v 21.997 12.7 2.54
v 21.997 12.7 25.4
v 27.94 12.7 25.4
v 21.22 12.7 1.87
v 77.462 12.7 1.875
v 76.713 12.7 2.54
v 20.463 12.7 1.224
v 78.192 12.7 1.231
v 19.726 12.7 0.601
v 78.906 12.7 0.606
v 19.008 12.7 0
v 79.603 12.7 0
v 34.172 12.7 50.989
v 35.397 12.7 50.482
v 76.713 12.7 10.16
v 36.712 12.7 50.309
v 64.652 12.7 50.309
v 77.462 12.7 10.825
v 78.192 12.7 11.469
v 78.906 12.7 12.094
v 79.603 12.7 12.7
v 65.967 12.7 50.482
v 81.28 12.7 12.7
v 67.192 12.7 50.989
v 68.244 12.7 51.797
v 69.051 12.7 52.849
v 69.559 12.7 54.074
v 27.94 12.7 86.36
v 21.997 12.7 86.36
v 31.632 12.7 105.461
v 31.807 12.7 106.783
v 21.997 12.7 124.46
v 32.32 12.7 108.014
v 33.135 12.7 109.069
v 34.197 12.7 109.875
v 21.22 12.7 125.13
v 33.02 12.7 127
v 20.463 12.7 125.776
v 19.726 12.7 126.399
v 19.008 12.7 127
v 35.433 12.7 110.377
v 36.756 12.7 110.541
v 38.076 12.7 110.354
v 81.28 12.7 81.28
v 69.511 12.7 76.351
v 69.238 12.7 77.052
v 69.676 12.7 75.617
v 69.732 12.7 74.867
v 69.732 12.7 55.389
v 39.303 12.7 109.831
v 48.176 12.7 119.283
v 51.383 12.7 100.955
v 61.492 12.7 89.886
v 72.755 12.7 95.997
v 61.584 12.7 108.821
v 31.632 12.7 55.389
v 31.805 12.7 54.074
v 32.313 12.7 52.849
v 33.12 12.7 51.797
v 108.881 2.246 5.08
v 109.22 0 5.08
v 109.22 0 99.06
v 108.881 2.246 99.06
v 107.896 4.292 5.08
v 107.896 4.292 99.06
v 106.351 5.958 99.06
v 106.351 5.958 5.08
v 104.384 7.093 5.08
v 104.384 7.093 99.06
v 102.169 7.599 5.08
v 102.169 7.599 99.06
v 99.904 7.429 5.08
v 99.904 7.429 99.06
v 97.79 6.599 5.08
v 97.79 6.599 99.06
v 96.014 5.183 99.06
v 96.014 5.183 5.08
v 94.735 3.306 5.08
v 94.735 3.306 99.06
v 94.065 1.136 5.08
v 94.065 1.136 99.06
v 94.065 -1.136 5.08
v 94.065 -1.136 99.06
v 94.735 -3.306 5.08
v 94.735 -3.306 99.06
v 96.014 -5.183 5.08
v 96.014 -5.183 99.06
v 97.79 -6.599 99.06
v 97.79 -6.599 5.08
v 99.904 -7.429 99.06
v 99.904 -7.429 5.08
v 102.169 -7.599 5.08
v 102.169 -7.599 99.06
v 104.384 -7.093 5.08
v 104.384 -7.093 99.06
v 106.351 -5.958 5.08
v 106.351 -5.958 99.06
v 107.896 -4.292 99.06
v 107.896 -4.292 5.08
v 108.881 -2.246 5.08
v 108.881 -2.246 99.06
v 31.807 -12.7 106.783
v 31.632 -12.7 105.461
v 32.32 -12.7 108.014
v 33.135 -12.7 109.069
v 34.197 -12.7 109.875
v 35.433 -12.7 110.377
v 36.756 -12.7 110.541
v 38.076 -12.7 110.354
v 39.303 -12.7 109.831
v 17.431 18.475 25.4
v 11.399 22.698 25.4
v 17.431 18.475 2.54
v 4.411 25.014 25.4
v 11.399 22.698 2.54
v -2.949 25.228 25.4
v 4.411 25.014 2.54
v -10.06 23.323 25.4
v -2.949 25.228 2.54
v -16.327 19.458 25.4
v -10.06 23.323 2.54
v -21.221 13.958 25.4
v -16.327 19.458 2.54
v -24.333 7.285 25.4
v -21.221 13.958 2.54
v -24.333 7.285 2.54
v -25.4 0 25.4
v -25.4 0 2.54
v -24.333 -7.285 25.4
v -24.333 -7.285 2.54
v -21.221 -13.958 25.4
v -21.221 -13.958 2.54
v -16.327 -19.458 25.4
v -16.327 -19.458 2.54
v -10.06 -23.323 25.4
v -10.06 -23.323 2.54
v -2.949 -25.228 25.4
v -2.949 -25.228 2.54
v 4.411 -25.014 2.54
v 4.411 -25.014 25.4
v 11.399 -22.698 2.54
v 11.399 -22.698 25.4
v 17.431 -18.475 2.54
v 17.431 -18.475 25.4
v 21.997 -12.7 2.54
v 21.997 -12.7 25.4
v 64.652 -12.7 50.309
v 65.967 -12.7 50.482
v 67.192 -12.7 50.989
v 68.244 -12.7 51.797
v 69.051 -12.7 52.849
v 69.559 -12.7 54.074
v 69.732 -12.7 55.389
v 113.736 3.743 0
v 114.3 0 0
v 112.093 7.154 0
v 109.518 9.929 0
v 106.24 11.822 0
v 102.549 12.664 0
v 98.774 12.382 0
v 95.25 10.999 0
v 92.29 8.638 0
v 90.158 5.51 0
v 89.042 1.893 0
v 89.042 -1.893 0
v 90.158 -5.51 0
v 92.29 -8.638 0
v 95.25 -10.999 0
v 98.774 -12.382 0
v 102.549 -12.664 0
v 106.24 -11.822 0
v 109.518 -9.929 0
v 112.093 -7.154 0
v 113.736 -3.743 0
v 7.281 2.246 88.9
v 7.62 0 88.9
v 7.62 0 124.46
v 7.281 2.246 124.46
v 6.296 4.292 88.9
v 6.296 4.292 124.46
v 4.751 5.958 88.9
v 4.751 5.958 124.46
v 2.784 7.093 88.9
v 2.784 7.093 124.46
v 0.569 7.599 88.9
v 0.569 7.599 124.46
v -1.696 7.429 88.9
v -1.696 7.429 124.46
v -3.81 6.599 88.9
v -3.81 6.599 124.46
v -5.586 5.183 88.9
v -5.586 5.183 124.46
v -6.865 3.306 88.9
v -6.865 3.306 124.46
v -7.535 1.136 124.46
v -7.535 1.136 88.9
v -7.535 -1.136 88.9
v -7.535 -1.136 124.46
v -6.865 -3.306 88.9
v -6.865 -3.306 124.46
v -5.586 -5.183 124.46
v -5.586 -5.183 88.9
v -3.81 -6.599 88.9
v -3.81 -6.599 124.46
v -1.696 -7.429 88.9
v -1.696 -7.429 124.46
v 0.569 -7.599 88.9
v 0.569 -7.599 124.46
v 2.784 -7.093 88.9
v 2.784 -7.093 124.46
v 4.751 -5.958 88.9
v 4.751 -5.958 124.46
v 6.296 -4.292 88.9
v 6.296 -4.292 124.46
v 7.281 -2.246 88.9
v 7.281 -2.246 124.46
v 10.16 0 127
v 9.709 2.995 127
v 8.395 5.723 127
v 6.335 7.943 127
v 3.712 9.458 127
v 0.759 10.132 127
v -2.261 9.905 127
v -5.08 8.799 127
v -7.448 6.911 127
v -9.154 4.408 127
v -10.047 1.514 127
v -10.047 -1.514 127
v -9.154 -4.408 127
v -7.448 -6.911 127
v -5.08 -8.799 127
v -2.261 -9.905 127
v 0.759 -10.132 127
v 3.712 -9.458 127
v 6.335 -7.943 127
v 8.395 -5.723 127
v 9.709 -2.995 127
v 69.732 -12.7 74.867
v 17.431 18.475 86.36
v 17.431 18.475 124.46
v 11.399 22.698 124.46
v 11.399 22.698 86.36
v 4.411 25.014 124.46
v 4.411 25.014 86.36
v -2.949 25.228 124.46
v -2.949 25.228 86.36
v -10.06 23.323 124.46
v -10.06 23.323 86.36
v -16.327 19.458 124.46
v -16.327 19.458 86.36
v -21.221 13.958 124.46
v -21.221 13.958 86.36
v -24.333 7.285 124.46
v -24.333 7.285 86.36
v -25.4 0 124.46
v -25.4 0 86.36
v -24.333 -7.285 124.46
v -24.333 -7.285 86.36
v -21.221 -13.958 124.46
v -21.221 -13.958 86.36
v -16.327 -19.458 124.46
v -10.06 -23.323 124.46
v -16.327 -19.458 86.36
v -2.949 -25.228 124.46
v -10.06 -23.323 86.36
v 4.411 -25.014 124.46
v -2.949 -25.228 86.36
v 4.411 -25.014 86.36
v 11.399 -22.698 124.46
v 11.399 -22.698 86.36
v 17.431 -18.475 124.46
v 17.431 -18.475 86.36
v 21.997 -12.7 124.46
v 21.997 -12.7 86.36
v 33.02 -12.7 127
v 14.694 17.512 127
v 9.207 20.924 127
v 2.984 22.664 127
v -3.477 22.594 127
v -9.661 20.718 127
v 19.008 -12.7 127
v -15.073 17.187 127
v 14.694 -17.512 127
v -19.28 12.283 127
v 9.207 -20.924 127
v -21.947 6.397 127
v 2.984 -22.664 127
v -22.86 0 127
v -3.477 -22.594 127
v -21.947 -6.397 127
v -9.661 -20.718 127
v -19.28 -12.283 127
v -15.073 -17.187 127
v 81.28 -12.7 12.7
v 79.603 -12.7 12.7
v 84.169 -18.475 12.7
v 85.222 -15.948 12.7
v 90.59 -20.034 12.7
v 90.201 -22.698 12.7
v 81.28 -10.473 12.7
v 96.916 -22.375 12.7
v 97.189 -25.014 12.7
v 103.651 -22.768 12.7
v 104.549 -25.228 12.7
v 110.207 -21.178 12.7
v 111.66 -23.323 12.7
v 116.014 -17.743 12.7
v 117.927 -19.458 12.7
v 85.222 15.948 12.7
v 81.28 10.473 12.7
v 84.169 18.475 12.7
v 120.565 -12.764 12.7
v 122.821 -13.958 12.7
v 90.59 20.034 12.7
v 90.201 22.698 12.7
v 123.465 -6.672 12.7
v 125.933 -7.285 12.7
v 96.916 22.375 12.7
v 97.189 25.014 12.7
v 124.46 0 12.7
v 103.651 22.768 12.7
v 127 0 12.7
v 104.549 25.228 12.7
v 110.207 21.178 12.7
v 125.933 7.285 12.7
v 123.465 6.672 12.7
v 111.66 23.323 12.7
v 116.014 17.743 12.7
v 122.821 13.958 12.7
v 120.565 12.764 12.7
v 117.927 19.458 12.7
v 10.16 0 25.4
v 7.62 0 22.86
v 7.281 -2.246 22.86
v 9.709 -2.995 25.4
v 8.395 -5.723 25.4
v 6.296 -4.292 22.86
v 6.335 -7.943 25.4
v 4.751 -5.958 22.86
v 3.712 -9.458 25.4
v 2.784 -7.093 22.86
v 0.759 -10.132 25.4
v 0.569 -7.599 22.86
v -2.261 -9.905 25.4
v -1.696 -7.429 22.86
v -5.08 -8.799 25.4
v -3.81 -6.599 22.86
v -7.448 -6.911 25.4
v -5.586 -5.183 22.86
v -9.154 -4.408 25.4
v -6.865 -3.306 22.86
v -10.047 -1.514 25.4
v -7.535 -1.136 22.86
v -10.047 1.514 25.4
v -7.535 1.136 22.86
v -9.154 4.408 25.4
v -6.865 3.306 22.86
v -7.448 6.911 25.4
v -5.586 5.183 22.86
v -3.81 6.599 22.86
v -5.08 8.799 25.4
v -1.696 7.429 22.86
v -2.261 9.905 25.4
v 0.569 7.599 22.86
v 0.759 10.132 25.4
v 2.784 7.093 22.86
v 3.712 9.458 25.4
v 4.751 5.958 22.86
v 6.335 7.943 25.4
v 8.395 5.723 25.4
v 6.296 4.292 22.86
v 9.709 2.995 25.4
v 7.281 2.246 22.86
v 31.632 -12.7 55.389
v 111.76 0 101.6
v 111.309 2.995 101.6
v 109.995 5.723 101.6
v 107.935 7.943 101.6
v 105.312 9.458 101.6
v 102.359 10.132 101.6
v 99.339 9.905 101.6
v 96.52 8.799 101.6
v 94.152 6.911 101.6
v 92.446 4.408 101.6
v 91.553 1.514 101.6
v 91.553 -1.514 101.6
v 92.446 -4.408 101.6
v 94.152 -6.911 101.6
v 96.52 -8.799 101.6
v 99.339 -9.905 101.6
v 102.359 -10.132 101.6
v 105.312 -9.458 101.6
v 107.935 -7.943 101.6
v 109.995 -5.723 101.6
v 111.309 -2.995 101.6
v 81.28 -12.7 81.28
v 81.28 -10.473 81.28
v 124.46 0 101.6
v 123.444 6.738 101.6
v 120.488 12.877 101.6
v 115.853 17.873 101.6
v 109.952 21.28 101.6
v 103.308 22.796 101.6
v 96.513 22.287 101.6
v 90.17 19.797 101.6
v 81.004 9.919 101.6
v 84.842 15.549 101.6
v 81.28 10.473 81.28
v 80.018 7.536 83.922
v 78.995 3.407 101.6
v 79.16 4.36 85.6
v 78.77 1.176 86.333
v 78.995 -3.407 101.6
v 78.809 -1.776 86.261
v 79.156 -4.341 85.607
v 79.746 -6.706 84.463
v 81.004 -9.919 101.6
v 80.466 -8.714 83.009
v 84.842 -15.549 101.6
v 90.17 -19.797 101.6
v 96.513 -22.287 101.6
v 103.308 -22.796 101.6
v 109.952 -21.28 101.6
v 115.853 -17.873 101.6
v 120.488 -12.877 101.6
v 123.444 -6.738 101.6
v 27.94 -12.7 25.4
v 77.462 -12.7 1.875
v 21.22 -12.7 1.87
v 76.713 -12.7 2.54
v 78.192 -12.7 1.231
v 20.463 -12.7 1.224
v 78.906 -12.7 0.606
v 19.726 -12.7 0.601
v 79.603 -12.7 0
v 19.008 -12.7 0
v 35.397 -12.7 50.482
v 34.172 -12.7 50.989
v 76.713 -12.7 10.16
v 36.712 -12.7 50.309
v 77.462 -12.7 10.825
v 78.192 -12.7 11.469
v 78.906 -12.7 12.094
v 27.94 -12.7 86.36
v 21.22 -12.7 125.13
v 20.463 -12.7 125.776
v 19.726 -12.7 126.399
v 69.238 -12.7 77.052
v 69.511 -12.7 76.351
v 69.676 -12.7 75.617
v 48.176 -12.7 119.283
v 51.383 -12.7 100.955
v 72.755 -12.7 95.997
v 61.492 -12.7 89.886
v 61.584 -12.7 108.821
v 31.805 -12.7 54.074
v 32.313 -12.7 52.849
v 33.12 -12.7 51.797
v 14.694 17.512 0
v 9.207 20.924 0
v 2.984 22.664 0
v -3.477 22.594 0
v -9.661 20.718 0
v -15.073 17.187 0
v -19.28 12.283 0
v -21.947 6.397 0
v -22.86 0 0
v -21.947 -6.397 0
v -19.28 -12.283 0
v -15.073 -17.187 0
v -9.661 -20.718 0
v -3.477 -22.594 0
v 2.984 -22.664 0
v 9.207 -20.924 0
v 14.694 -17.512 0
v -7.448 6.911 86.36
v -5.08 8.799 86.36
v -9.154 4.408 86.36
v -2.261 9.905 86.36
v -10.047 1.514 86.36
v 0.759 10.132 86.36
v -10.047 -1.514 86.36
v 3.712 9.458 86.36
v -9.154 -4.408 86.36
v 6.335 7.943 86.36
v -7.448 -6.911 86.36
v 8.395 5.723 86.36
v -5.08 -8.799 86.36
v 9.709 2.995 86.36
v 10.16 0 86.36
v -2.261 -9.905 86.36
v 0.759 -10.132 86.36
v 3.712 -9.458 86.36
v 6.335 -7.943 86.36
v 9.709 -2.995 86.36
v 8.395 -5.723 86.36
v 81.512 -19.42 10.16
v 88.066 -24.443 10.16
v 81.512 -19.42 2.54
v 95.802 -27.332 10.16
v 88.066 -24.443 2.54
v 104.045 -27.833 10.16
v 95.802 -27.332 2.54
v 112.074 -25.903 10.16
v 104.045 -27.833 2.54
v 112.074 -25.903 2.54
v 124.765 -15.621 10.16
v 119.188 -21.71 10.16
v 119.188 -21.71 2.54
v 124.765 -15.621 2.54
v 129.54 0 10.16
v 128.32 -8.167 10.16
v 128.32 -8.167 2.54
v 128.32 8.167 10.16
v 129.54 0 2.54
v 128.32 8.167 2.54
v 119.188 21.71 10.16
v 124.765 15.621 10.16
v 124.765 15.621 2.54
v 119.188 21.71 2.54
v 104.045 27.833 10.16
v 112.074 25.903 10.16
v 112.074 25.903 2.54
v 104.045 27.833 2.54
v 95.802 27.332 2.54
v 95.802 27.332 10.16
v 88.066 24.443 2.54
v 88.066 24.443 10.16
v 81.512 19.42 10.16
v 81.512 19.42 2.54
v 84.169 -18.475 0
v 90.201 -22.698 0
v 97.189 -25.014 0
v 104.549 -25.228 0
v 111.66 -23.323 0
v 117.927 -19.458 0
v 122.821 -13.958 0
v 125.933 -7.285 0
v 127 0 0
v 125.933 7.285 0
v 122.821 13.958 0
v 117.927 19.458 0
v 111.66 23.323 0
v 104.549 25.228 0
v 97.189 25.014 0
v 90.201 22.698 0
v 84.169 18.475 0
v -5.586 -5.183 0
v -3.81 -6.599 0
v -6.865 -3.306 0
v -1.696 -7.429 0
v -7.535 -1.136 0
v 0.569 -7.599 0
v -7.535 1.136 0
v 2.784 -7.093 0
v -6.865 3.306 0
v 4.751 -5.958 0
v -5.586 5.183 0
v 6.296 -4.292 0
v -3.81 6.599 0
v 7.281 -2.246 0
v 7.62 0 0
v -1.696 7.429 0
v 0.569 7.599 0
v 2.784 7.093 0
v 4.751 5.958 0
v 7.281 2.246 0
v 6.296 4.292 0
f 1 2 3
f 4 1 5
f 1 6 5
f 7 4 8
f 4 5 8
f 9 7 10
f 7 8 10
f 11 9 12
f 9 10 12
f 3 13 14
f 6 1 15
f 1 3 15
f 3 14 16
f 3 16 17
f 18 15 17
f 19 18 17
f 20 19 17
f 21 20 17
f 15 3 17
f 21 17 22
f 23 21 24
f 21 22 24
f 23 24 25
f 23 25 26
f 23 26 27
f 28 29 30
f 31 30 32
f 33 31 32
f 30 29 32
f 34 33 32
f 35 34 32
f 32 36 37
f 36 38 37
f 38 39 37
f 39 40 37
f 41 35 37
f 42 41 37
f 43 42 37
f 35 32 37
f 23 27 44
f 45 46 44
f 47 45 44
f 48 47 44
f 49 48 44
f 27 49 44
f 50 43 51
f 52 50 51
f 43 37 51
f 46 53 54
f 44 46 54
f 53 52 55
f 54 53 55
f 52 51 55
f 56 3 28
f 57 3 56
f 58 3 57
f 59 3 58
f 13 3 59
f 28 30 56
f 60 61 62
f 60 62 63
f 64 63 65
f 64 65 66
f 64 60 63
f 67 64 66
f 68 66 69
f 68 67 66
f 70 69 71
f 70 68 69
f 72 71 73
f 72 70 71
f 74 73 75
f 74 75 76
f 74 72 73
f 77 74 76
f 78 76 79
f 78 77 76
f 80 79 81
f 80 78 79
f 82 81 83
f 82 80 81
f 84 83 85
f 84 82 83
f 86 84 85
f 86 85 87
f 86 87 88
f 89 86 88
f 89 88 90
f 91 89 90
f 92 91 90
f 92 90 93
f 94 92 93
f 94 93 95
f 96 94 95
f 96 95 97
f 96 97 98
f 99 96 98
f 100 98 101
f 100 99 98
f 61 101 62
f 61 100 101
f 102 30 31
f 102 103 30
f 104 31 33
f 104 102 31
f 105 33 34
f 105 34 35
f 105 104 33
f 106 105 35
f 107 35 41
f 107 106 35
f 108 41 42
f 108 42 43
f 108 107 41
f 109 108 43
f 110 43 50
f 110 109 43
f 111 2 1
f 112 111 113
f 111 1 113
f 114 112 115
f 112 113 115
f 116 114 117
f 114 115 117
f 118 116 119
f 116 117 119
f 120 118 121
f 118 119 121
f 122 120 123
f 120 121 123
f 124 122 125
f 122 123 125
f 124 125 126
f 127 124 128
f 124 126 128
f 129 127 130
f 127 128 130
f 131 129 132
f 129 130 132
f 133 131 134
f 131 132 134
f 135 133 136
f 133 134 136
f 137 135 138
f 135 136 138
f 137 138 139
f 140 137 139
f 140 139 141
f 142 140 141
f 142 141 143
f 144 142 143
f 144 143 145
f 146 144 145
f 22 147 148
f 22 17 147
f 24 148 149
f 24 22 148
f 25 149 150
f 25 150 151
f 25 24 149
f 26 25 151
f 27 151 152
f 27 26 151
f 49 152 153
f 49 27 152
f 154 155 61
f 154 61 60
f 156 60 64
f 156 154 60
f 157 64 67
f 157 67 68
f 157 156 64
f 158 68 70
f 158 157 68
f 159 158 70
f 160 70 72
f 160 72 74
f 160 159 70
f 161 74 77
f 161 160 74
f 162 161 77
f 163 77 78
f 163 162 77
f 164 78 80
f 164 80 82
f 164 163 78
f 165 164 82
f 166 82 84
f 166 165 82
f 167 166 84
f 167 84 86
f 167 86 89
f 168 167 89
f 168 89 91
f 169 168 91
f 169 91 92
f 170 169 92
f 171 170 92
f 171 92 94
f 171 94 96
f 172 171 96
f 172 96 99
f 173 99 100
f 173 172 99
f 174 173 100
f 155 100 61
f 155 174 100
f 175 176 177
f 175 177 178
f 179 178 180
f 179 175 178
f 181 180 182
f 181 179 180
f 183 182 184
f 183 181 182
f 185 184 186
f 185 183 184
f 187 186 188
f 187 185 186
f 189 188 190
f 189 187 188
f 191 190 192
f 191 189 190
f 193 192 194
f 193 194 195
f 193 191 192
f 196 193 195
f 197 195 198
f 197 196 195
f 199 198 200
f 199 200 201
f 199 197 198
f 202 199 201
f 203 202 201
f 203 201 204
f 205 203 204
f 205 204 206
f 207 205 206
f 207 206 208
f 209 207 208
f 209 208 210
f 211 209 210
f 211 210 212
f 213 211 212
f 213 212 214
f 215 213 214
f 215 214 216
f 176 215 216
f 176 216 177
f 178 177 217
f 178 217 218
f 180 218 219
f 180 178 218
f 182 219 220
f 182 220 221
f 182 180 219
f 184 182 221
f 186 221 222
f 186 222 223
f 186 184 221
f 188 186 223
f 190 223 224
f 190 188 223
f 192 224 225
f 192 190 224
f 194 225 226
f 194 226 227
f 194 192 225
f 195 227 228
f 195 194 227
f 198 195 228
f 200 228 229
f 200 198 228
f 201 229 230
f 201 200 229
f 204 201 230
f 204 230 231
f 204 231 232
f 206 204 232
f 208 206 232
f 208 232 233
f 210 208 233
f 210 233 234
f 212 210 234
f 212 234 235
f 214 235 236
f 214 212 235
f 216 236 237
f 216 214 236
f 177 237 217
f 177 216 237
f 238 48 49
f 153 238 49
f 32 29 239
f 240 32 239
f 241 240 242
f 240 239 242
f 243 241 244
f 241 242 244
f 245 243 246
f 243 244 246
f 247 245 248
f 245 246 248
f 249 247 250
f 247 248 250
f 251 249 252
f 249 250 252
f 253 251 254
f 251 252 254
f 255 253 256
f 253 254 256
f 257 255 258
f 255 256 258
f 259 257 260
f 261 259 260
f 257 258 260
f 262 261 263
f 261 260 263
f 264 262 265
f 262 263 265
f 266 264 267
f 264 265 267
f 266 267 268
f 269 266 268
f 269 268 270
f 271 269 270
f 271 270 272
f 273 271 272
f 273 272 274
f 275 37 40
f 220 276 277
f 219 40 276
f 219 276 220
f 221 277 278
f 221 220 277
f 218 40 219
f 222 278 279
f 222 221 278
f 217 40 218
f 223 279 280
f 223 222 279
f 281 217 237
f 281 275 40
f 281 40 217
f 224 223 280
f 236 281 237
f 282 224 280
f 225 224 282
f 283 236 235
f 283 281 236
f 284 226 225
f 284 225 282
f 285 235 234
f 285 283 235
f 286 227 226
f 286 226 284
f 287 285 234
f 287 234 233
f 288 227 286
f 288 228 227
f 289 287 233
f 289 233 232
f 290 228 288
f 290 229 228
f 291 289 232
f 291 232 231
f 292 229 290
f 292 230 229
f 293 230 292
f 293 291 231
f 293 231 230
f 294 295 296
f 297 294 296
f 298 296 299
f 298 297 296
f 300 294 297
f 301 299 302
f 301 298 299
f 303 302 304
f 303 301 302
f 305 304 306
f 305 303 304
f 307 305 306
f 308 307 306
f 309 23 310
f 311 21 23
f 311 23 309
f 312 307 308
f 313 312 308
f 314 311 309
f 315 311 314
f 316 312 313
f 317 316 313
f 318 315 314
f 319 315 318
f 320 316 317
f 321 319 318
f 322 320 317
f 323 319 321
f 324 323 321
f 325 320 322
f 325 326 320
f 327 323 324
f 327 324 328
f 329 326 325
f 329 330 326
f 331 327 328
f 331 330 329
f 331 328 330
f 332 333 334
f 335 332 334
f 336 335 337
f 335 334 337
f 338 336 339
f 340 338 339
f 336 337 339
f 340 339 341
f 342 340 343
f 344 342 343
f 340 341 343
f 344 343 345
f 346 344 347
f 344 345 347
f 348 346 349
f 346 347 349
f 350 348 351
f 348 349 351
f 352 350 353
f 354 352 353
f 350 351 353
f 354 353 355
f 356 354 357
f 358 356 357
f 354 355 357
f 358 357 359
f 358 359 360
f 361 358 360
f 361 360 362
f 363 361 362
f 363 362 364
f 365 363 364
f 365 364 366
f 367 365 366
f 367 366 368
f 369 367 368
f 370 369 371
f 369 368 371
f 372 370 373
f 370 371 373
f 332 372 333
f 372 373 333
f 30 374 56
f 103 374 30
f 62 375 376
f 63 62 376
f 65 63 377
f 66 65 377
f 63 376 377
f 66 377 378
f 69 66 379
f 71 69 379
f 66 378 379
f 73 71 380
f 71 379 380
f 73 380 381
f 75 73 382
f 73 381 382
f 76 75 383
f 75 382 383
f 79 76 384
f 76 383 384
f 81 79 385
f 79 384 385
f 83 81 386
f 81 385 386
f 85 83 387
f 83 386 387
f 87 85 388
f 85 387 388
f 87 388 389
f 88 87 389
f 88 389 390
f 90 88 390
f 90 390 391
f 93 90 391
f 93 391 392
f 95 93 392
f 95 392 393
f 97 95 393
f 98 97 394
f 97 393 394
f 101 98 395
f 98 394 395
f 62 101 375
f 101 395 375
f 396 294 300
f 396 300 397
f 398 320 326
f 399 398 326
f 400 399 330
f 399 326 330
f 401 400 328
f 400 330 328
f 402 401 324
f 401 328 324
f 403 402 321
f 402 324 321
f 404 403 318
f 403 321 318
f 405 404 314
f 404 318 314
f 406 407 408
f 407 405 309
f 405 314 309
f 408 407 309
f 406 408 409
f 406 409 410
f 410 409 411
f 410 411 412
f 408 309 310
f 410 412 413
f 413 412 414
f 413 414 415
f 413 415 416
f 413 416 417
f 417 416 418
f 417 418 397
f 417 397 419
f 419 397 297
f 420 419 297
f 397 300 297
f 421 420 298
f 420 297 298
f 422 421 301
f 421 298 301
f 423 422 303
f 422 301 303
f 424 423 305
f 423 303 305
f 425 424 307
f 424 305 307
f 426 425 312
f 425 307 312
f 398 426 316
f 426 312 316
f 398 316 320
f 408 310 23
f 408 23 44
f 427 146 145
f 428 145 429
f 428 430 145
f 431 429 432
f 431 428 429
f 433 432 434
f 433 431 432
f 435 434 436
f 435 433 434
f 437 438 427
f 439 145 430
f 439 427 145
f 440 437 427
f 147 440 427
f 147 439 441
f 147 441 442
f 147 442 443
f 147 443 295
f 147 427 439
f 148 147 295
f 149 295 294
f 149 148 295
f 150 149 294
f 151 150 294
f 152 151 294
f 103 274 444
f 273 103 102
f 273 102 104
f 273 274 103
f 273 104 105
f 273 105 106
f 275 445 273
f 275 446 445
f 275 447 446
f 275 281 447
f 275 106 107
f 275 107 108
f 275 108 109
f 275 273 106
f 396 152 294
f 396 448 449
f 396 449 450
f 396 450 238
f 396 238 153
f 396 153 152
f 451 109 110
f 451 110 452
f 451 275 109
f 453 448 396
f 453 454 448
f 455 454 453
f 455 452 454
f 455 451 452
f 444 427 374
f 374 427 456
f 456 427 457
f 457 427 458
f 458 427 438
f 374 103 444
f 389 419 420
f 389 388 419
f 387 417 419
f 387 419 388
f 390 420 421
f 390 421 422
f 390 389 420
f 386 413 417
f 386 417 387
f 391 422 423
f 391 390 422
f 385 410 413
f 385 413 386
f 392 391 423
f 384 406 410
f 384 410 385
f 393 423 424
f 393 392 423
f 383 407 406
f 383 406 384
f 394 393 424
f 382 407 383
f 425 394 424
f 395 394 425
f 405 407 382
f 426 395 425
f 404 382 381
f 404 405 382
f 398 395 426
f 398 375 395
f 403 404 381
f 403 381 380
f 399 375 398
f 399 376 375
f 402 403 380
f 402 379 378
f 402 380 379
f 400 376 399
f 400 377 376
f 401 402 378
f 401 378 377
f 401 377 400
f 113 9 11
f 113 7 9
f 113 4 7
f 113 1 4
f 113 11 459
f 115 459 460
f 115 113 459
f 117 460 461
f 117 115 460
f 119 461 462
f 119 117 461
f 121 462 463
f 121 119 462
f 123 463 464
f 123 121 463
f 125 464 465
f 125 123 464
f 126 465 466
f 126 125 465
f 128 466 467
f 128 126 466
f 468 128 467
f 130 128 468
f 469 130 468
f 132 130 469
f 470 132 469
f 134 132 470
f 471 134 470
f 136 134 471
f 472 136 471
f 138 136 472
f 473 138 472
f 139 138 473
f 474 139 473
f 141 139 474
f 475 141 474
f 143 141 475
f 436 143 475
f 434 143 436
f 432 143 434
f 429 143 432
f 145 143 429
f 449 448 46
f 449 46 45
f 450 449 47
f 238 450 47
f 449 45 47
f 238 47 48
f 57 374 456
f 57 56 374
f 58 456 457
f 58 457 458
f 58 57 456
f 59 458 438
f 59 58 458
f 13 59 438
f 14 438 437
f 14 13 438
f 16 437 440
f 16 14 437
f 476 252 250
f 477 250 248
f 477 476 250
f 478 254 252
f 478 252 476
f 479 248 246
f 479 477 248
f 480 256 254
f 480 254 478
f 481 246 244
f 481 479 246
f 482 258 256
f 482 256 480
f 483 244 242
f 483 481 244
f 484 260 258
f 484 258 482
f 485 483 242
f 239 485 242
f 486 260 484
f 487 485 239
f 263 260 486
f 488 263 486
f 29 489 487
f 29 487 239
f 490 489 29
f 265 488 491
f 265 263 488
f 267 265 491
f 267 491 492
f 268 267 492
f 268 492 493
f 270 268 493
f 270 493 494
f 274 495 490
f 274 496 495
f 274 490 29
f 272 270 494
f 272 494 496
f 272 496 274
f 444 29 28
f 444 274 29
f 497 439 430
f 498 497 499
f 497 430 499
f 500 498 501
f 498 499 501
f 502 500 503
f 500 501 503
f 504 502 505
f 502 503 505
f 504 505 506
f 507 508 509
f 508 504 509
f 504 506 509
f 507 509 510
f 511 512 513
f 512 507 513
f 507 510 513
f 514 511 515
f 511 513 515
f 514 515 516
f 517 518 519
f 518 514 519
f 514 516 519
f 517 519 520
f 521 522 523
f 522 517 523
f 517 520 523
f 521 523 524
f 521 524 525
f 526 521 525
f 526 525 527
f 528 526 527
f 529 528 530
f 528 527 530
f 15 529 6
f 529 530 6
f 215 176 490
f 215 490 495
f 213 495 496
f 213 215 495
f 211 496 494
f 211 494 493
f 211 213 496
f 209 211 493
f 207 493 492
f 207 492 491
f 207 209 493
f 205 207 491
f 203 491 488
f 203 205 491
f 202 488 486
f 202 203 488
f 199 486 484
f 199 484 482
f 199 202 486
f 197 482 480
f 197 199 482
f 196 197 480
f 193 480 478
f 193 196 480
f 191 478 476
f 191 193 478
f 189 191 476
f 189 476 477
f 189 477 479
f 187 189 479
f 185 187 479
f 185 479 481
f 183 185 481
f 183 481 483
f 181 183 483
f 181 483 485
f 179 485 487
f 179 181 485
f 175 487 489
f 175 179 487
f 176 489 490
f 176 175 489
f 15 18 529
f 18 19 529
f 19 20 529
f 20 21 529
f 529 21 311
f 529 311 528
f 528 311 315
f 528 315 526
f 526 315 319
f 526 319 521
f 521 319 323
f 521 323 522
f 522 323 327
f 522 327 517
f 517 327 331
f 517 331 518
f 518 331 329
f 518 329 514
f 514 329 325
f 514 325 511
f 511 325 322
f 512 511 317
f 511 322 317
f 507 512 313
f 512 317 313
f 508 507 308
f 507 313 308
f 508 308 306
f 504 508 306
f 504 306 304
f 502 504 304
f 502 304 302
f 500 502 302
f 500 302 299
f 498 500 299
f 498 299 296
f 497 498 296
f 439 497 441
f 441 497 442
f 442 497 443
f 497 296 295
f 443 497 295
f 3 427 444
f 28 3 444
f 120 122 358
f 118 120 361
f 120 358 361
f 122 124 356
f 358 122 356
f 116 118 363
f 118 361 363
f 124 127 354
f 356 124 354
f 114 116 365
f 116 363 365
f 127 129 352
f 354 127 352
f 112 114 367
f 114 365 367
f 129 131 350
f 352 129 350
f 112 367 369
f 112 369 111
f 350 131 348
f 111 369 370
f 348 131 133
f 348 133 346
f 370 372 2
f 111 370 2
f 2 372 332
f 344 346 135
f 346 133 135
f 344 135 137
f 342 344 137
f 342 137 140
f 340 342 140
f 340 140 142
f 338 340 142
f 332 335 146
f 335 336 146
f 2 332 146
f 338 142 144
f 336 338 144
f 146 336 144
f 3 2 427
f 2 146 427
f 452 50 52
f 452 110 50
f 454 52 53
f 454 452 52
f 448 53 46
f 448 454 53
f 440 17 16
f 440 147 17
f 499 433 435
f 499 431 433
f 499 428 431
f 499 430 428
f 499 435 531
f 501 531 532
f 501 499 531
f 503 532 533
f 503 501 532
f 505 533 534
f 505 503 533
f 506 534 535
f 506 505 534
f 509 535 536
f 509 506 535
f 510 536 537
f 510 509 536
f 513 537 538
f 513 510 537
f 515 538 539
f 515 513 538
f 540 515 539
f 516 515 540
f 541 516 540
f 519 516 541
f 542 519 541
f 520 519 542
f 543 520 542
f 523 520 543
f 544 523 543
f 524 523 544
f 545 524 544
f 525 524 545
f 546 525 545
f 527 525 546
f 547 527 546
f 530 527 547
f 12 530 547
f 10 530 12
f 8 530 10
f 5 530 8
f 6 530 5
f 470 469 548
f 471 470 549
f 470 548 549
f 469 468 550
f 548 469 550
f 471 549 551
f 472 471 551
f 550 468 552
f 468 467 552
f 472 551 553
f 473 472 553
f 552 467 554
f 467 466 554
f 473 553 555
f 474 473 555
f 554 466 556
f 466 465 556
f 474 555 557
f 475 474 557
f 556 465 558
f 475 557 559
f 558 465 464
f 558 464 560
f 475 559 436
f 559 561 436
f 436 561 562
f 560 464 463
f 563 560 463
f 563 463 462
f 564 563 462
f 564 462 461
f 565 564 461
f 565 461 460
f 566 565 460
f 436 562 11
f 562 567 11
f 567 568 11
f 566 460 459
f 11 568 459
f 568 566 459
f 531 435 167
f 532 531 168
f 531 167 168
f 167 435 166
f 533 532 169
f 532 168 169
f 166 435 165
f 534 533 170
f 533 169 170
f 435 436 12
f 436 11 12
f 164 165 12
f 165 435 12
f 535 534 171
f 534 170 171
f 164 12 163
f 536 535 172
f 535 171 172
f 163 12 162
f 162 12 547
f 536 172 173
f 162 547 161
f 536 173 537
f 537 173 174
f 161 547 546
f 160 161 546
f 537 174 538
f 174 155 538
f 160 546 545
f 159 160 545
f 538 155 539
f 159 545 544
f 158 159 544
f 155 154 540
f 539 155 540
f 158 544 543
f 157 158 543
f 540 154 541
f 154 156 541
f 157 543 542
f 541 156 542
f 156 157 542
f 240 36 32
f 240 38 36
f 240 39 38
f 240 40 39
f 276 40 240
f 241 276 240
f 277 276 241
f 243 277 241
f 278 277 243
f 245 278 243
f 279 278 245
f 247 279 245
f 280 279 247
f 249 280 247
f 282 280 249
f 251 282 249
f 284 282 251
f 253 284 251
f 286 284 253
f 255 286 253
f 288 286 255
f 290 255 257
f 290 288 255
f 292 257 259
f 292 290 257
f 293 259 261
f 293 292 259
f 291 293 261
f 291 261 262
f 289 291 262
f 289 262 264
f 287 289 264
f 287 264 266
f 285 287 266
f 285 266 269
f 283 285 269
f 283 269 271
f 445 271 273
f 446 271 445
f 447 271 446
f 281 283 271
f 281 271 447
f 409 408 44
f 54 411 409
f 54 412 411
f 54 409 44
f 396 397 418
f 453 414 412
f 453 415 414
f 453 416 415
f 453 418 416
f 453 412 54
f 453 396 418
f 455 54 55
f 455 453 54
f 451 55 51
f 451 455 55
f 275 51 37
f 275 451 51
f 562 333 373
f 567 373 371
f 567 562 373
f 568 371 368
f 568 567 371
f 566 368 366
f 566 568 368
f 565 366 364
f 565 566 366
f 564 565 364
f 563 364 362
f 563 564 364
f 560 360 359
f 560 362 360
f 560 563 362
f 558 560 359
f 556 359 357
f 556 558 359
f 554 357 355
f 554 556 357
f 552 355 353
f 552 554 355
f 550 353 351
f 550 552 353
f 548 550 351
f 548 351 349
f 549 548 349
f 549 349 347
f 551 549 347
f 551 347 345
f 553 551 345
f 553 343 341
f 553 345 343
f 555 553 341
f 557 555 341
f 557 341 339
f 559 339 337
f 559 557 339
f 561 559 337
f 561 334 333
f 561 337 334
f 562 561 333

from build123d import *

# Parameters (mm, degrees)
F0_R      = 25.4
F0_R_2    = 7.62
F1_DEPTH  = 127
F0_R_3    = 22.86
F2_DEPTH  = 101.6
F4_DEPTH  = 12.7
F5_W      = 60.96
F5_H      = 60.96
F6_DEPTH  = 50.8
F7_R      = 5.08
F8_SIZE   = 2.54
F9_R      = 27.94
F9_R_2    = 22.86
F10_DEPTH = 12.7
F11_SIZE  = 5.08
F12_SIZE  = 2.54
F13_SIZE  = 2.54
F14_SIZE  = 2.54


with BuildPart() as f1:
    # F0 (on Top) → F1 (new body)
    with BuildSketch(Plane.XY):
        Circle(F0_R)
        Circle(F0_R_2, mode=Mode.SUBTRACT)
    extrude(amount=F1_DEPTH)



with BuildPart() as f2:
    # F0 (on Top) → F2 (new body)
    with BuildSketch(Plane.XY):
        with Locations((101.6, 0)):
            Circle(F0_R_3)
        with Locations((101.6, 0)):
            Circle(F0_R_2, mode=Mode.SUBTRACT)
    extrude(amount=F2_DEPTH)


with BuildPart() as f1_1:
    add(f1.part)

    add(f2.part)  # F4 merges F2
    # F3 (on Front) → F4 (join, symmetric)
    with BuildSketch(Plane.XZ):
        with BuildLine():
            Line((20.32, 127), (20.32, 0))
            Line((20.32, 0), (81.28, 0))
            Line((81.28, 0), (81.28, 81.28))
            ThreePointArc((81.28, 81.28), (61.5844056789, 108.82076155), (33.02, 127))
            Line((33.02, 127), (20.32, 127))
        make_face()
        with BuildLine():
            ThreePointArc((31.63198664, 113.8086976228), (54.1219978961, 98.3677847047), (69.73198664, 75.9947954215))
            Line((69.73198664, 75.9947954215), (69.73198664, 50.3086976228))
            Line((69.73198664, 50.3086976228), (31.63198664, 50.3086976228))
            Line((31.63198664, 50.3086976228), (31.63198664, 113.8086976228))
        make_face(mode=Mode.SUBTRACT)
    extrude(amount=F4_DEPTH, both=True)

    # F5 (on Front) → F6 (cut, symmetric)
    with BuildSketch(Plane.XZ):
        with Locations((-2.54, 55.88)):
            Rectangle(F5_W, F5_H)
    extrude(amount=F6_DEPTH, both=True, mode=Mode.SUBTRACT)

    # F7
    f7_edges = [f1_1.edges().sort_by_distance(p)[0] for p in [
        (31.631987, 0, 50.308698),
        (31.631987, 0, 113.808698),
        (69.731987, 0, 50.308698),
        (69.731987, 0, 75.994795),
    ]]
    fillet(f7_edges, radius=F7_R)

    # F8
    f8_edges = [f1_1.edges().sort_by_distance(p)[0] for p in [
        (-25.4, 0, 127),
        (-25.4, 0, 0),
        (-7.62, 0, 86.36),
        (-7.62, 0, 25.4),
    ]]
    chamfer(f8_edges, length=F8_SIZE)

    # F9 (on Top) → F10 (join)
    with BuildSketch(Plane.XY):
        with Locations((101.6, 0)):
            Circle(F9_R)
        with Locations((101.6, 0)):
            Circle(F9_R_2, mode=Mode.SUBTRACT)
    extrude(amount=F10_DEPTH)

    # F11
    f11_edges = [f1_1.edges().sort_by_distance(p)[0] for p in [
        (93.98, 0, 0),
    ]]
    chamfer(f11_edges, length=F11_SIZE)

    # F12
    f12_edges = [f1_1.edges().sort_by_distance(p)[0] for p in [
        (93.98, 0, 101.6),
    ]]
    chamfer(f12_edges, length=F12_SIZE)

    # F13
    f13_edges = [f1_1.edges().sort_by_distance(p)[0] for p in [
        (129.54, 0, 12.7),
        (129.54, 0, 0),
    ]]
    chamfer(f13_edges, length=F13_SIZE)

    # F14
    f14_edges = [f1_1.edges().sort_by_distance(p)[0] for p in [
        (-7.62, 0, 127),
    ]]
    chamfer(f14_edges, length=F14_SIZE)


solid = f1_1.part
